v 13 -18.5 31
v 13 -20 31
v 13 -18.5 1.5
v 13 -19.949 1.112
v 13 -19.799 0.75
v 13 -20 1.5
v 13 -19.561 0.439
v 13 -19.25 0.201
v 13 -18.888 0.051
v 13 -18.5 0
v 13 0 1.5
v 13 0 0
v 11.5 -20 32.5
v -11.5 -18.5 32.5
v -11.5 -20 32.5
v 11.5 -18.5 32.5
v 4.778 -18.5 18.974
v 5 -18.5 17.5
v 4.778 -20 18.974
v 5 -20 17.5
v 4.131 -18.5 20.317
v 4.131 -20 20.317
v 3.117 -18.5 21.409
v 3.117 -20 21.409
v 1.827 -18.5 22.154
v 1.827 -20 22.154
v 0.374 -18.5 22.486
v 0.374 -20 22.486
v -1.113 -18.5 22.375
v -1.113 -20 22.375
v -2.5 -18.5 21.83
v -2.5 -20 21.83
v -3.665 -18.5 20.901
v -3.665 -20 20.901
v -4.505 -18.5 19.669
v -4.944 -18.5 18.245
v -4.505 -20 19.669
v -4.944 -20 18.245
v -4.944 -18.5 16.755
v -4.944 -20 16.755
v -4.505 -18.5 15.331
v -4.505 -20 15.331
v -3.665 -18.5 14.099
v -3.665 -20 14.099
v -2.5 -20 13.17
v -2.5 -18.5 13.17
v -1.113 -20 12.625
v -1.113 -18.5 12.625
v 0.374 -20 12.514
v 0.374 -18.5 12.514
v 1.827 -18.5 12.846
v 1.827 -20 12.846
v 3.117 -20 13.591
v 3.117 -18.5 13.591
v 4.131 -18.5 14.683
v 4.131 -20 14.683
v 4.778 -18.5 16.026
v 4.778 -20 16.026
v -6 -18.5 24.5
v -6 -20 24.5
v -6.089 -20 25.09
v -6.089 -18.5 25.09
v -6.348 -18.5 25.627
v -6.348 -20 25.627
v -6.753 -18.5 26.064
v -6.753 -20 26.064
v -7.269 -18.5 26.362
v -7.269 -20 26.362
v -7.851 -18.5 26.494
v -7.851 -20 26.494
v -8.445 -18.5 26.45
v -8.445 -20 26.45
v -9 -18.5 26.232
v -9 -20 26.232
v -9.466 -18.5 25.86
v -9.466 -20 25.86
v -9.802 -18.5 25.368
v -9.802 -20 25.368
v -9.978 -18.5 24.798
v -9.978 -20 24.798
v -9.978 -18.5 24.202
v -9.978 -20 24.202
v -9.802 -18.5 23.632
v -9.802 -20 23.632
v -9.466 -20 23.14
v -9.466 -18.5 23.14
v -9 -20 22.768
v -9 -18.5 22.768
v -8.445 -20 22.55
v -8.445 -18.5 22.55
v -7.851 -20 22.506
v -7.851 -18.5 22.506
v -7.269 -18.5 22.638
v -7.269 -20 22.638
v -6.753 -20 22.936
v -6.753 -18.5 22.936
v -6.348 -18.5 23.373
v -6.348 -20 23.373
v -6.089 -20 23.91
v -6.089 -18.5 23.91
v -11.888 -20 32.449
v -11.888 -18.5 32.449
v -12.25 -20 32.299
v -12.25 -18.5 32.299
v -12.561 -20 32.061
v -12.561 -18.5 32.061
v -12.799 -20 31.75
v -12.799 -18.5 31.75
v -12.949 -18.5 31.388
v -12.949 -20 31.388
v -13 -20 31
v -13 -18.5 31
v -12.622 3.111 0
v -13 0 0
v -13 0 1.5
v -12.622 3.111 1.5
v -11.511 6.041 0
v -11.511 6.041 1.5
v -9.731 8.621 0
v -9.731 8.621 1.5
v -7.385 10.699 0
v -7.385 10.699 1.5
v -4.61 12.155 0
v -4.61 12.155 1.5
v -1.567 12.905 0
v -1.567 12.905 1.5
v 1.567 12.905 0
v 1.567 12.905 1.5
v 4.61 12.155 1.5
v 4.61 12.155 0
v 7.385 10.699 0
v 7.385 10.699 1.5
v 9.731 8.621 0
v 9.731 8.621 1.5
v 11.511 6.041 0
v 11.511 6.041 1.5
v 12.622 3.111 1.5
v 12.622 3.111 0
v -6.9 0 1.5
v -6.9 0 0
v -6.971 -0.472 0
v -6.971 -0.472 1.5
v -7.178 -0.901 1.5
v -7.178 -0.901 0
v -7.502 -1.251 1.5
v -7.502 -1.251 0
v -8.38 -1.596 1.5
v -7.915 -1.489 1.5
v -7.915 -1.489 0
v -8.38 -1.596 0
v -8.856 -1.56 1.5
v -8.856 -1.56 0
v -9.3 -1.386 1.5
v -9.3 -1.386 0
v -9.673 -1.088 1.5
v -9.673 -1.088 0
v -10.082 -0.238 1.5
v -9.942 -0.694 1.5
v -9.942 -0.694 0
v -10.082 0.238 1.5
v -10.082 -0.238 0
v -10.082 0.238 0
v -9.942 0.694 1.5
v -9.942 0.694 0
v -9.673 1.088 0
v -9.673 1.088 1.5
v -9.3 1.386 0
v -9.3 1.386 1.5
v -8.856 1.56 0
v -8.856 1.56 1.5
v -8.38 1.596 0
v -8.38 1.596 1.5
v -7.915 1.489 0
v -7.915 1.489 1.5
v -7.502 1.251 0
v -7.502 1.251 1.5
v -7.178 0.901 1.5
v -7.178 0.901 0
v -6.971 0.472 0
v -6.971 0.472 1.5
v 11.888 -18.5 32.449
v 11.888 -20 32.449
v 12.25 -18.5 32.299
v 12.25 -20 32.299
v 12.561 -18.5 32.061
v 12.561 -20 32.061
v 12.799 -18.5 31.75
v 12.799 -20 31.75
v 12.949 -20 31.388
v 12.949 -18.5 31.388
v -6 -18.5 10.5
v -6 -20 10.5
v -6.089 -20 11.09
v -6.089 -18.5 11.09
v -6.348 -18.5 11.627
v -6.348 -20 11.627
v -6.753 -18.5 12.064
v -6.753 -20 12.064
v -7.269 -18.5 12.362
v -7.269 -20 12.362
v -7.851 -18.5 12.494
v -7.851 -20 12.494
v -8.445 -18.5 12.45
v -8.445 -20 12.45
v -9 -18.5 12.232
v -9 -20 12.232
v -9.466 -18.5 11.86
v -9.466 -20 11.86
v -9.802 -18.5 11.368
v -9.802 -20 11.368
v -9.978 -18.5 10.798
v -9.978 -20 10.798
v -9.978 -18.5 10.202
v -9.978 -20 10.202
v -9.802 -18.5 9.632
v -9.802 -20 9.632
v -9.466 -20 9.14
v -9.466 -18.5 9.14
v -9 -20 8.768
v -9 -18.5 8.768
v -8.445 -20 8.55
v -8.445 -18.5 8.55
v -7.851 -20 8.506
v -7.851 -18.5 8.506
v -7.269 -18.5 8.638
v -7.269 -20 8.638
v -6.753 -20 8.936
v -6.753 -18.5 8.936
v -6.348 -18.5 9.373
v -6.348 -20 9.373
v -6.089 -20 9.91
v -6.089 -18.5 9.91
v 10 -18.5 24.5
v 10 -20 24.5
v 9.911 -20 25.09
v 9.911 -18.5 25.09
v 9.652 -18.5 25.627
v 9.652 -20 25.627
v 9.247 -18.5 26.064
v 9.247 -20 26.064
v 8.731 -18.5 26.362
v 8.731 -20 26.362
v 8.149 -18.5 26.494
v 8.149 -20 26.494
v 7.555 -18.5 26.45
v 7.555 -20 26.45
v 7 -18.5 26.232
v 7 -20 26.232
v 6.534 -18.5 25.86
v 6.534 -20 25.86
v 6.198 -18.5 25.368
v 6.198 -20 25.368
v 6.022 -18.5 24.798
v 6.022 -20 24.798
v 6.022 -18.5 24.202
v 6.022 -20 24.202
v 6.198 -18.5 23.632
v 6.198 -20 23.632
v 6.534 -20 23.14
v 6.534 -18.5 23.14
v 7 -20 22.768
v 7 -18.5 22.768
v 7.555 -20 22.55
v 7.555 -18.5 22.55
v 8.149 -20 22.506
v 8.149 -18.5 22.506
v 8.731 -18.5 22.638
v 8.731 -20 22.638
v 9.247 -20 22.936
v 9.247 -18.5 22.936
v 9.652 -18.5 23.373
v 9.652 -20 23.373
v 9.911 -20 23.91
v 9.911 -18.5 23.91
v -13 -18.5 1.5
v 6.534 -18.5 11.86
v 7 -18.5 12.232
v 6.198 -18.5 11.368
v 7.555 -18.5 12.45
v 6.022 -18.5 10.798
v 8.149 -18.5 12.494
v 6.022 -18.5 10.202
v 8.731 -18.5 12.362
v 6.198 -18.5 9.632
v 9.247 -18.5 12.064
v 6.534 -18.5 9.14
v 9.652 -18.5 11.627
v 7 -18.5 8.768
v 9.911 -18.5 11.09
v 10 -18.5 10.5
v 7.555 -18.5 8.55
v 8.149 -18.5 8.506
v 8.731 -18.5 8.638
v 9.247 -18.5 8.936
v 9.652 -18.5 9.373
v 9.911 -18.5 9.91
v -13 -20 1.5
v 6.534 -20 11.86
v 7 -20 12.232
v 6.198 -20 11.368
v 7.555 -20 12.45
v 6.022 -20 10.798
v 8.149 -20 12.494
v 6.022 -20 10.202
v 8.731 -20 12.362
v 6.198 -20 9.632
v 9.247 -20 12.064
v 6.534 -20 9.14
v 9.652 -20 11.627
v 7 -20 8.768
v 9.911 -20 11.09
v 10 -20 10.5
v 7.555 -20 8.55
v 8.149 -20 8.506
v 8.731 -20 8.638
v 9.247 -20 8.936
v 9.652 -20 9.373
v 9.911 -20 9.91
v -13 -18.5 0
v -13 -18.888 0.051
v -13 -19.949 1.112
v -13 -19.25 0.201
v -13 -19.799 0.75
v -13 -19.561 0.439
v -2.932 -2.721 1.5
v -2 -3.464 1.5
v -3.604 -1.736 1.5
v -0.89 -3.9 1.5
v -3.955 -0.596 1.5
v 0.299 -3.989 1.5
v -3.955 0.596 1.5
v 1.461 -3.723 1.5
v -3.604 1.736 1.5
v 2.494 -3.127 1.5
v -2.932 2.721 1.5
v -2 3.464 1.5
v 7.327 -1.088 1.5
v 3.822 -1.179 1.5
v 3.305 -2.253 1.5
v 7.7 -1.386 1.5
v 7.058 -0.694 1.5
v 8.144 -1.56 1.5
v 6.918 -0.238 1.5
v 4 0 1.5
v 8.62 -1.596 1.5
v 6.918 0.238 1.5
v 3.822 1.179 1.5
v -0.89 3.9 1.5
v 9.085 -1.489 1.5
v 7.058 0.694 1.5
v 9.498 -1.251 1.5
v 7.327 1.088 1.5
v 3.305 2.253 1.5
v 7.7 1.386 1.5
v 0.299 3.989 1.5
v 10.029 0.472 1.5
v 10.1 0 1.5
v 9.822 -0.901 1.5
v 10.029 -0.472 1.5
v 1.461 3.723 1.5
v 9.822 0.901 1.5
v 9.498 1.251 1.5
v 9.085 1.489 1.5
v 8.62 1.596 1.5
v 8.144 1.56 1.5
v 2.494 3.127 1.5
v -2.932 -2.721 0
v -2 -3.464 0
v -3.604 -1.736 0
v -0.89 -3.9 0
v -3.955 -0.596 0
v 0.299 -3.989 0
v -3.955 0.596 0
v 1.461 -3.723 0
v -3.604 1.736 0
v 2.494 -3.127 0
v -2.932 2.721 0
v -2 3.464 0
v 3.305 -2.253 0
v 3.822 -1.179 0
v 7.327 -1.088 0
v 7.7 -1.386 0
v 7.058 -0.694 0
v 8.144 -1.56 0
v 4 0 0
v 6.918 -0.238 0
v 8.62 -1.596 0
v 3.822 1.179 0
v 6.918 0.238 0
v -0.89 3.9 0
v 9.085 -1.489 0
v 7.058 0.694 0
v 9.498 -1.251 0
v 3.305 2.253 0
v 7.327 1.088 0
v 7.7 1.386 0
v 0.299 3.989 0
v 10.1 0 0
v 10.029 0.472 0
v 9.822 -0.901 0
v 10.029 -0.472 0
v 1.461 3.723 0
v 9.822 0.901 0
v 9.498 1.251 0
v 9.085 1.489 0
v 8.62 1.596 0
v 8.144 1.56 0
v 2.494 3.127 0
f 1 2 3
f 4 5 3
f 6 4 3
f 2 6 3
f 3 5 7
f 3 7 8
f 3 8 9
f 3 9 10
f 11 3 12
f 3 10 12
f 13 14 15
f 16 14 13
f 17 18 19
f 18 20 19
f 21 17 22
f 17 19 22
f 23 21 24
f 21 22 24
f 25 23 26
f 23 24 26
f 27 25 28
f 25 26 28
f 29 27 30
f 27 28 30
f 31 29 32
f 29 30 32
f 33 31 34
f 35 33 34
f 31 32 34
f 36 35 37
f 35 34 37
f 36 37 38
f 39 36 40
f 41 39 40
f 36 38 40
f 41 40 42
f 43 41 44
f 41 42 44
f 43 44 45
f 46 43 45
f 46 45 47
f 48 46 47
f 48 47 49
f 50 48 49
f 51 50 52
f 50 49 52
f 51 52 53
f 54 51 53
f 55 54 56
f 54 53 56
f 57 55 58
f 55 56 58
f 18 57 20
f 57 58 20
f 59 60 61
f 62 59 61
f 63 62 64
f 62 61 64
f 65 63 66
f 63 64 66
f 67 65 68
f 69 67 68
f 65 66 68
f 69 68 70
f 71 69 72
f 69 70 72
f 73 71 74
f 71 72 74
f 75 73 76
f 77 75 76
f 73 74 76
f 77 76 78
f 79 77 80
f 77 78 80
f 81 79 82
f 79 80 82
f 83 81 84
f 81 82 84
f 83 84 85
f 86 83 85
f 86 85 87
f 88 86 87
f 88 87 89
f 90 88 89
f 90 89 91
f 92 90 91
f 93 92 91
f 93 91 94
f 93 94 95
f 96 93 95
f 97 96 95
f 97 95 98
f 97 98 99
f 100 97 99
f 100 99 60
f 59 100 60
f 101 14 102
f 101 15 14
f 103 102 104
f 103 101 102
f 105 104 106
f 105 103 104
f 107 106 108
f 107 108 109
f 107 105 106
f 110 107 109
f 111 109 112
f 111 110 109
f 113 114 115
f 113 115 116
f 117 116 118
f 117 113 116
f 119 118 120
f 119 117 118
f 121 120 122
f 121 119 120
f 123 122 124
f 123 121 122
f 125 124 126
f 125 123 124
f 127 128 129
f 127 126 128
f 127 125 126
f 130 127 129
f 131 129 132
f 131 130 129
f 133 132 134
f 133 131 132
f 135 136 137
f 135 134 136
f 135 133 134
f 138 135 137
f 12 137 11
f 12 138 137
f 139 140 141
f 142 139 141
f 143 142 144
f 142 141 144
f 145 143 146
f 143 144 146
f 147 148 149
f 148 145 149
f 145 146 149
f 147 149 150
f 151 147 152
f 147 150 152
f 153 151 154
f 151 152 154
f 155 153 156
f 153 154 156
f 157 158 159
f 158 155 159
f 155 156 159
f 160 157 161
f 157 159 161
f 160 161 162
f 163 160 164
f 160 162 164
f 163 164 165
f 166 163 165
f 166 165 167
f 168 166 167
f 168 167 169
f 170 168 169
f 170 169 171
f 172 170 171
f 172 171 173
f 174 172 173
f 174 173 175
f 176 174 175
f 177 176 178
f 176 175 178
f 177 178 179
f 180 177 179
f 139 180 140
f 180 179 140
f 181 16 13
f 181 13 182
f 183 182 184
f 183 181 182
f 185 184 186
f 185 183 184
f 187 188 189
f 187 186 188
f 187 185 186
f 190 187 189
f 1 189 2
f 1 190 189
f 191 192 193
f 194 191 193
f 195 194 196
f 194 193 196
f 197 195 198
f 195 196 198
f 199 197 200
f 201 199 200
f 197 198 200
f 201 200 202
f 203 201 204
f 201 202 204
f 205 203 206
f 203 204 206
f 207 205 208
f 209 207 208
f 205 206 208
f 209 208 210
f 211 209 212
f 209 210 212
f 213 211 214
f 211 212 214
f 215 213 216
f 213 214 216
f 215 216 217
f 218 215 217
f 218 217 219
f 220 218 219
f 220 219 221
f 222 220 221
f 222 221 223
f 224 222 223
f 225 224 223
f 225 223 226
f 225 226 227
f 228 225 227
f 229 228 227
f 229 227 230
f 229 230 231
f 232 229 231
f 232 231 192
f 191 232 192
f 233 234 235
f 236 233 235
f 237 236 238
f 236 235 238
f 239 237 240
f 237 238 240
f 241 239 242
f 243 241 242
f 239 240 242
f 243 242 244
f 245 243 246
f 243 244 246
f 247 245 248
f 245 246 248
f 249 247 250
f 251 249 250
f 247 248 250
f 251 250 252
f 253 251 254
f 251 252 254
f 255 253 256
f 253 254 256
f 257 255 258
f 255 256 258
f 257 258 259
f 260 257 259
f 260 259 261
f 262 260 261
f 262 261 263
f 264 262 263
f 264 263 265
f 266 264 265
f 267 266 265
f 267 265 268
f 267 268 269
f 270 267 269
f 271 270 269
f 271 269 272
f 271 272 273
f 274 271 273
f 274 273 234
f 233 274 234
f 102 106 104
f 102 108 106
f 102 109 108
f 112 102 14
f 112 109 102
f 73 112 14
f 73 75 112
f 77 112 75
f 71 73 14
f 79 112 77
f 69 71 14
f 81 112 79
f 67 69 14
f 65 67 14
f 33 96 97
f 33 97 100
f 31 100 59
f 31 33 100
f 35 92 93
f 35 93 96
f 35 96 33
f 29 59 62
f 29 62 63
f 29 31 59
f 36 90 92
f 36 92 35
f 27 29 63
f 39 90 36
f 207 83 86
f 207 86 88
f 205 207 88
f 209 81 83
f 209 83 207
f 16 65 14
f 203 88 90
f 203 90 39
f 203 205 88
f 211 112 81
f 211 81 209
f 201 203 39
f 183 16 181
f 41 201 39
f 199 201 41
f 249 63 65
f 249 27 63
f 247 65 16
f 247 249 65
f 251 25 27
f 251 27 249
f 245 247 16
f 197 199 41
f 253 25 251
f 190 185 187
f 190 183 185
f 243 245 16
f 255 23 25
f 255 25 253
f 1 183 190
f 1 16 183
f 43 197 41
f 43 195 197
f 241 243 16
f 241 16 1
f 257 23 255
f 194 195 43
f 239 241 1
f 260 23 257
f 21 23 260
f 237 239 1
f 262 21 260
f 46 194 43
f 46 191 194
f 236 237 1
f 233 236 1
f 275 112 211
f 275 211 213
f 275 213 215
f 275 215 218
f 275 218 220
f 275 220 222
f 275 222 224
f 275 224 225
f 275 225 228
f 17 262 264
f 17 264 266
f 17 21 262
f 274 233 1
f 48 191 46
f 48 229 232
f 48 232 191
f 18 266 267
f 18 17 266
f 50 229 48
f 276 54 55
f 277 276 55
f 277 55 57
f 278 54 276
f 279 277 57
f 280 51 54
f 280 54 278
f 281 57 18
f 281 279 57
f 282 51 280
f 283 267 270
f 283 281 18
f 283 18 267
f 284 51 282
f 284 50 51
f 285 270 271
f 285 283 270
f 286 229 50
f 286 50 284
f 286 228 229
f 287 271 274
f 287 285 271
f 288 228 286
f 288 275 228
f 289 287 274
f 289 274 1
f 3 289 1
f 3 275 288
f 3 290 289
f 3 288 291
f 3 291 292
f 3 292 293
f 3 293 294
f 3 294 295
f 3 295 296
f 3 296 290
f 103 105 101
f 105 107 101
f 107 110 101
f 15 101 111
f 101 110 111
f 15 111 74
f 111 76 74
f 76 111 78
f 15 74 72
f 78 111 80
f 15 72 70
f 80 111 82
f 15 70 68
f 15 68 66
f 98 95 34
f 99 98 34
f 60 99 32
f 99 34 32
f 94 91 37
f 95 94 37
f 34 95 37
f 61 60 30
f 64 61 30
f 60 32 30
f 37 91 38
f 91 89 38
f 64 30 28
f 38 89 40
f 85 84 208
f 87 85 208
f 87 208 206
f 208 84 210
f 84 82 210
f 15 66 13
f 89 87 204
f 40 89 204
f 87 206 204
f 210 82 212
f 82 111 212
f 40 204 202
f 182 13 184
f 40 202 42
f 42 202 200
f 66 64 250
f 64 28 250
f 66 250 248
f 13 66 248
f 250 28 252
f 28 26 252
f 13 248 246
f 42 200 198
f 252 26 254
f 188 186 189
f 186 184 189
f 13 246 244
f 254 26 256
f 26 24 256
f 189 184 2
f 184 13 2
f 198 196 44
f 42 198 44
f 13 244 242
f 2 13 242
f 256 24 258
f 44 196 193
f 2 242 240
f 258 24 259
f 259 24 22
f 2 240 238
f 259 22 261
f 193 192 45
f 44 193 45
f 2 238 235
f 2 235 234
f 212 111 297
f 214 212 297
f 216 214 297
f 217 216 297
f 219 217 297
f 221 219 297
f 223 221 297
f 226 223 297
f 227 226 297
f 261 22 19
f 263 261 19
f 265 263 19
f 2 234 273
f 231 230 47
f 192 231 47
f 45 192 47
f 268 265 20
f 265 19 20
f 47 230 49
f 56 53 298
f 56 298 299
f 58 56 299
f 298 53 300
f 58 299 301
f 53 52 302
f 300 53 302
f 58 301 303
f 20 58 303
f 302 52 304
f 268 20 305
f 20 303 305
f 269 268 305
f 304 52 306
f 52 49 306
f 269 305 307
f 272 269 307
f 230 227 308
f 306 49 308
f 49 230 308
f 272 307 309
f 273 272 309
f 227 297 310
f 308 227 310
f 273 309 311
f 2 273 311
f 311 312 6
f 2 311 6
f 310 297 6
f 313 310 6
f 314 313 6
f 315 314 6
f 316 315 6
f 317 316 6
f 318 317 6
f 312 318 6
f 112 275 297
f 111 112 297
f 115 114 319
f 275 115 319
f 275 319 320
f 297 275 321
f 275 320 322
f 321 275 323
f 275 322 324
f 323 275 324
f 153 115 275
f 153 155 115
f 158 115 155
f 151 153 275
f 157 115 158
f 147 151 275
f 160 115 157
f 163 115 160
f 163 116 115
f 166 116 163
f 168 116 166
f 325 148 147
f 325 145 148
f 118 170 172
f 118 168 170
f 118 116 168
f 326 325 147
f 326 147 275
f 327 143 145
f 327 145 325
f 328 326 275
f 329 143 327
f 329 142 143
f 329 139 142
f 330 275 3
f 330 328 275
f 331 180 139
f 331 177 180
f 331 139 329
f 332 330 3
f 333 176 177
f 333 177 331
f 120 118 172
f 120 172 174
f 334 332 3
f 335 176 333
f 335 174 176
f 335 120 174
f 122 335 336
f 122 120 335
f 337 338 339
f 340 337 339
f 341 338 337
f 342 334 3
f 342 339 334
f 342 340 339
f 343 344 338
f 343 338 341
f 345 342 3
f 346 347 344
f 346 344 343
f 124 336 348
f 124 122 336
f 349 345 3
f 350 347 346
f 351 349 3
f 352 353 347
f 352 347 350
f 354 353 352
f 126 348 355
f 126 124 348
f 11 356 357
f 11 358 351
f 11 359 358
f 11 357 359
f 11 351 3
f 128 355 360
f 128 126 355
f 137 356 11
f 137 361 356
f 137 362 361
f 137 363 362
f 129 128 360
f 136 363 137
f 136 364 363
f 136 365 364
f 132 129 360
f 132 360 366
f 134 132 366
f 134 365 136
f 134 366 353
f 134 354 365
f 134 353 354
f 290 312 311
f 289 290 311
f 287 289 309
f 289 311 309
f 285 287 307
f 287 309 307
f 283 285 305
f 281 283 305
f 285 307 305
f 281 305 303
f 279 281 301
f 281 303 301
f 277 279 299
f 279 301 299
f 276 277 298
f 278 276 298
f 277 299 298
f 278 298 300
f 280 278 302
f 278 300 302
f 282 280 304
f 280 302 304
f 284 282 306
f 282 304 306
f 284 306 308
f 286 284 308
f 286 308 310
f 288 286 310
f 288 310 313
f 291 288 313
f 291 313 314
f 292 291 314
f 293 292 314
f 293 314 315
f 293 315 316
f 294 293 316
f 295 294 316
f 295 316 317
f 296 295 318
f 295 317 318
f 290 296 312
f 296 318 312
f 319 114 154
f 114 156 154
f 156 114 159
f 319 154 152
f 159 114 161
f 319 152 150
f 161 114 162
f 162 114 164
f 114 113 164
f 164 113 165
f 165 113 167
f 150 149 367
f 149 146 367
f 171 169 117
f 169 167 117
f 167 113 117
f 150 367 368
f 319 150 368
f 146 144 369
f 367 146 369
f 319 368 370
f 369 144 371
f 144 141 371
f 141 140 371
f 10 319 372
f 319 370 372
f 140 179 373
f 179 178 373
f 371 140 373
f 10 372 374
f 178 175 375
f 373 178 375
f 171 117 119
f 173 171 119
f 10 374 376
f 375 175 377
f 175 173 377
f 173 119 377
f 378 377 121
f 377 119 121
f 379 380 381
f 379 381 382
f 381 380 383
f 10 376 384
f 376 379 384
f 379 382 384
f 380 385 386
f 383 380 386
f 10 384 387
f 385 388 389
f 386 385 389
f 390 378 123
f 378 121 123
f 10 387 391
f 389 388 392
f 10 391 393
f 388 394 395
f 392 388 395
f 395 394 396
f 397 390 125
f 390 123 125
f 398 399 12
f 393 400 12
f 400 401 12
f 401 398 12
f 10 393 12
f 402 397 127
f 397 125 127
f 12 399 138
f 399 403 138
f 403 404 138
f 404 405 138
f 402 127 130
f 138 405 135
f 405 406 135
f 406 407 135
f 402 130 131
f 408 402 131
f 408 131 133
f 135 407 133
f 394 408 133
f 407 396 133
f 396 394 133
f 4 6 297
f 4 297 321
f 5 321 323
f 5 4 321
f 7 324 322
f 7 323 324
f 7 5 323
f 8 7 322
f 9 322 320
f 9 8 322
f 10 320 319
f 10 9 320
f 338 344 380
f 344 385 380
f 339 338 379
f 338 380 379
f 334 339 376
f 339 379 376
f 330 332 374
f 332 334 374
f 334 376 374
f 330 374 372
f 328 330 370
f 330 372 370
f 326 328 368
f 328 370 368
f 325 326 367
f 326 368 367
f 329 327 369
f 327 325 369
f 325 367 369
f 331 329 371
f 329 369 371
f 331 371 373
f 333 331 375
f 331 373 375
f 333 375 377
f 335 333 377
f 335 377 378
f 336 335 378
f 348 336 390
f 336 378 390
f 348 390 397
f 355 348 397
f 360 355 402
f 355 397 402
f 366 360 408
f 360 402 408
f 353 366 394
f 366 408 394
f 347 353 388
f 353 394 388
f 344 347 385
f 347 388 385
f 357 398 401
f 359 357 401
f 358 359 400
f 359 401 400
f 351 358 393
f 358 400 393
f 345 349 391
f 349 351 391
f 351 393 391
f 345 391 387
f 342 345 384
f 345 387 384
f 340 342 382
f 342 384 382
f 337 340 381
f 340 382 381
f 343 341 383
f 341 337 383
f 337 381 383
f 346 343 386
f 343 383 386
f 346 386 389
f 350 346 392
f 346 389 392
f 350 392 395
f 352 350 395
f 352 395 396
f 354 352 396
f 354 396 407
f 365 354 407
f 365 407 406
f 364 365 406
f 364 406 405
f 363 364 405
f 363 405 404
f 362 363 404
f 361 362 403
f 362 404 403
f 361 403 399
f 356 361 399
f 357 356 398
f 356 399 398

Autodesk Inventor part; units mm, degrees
ref_plane "YZ Plane" through (0, 0, 0) normal (1, 0, 0) x (0, 1, 0)
ref_plane "XZ Plane" through (0, 0, 0) normal (0, 1, 0) x (-1, 0, 0)
ref_plane "XY Plane" through (0, 0, 0) normal (0, 0, 1) x (1, 0, 0)
sketch "Sketch1" plane through (0, 0, 0) normal (0, 0, 1) x (1, 0, 0)
  arc A0 (13, 0) -> (-13, 0) centre (0, 0) ccw
  circle A1 centre (0, 0) radius 4
  line L0 (0, 13) -> (0, -20) construction
  line L1 (-13, 0) -> (-13, -20)
  line L2 (-13, -20) -> (13, -20)
  line L3 (13, -20) -> (13, 0)
  circle A2 centre (8.5, 0) radius 1.6
  circle A3 centre (-8.5, 0) radius 1.6
  line L4 (-13, -18.5) -> (13, -18.5)
  dimension "d1" = 13
  dimension "d2" = 33
  dimension "d3" = 3.2
  dimension "d4" = 8.5
  dimension "d5" = 8
  dimension "d6" = 1.5
extrude "Extrusion1" add sketch "Sketch1" along normal blind 1.5 contours L3 L4 L1 A0
extrude "Extrusion2" add sketch "Sketch1" along normal blind 32.5 contours L3 L2 L1 L4
fillet "Fillet1" radius 1.5 3 edges at (-13, -19.25, 32.5) (13, -19.25, 32.5) (0, -20, 0)
sketch "Sketch2" plane through (-13, -20, 1.5) normal (0, -1, 0) x (1, 0, 0)
  line L0 (26, 0) -> (0, 0) projected
  line L1 (0, 0) -> (0, 29.5) projected
  line L2 (24.5, 31) -> (1.5, 31) projected
  line L3 (13, 31) -> (13, 0) construction
  circle A0 centre (13, 16) radius 5
  circle A1 centre (21, 23) radius 2
  line L4 (21, 23) -> (21, 9) construction
  circle A2 centre (21, 9) radius 2
  circle A3 centre (5, 23) radius 2
  circle A4 centre (5, 9) radius 2
  line L5 (26, 0) -> (26, 29.5) projected
  point P0 (13, -1.5)
  dimension "d20" = 10
  dimension "d21" = 15
  dimension "d22" = 4
  dimension "d23" = 8
  dimension "d24" = 14
  dimension "d25" = 4
  dimension "d26" = 7
  dimension "d27" = 8
  dimension "d28" = 5
extrude "Extrusion3" cut sketch "Sketch2" against normal through all
properties part number "WH-Bracket-JGA25A"
